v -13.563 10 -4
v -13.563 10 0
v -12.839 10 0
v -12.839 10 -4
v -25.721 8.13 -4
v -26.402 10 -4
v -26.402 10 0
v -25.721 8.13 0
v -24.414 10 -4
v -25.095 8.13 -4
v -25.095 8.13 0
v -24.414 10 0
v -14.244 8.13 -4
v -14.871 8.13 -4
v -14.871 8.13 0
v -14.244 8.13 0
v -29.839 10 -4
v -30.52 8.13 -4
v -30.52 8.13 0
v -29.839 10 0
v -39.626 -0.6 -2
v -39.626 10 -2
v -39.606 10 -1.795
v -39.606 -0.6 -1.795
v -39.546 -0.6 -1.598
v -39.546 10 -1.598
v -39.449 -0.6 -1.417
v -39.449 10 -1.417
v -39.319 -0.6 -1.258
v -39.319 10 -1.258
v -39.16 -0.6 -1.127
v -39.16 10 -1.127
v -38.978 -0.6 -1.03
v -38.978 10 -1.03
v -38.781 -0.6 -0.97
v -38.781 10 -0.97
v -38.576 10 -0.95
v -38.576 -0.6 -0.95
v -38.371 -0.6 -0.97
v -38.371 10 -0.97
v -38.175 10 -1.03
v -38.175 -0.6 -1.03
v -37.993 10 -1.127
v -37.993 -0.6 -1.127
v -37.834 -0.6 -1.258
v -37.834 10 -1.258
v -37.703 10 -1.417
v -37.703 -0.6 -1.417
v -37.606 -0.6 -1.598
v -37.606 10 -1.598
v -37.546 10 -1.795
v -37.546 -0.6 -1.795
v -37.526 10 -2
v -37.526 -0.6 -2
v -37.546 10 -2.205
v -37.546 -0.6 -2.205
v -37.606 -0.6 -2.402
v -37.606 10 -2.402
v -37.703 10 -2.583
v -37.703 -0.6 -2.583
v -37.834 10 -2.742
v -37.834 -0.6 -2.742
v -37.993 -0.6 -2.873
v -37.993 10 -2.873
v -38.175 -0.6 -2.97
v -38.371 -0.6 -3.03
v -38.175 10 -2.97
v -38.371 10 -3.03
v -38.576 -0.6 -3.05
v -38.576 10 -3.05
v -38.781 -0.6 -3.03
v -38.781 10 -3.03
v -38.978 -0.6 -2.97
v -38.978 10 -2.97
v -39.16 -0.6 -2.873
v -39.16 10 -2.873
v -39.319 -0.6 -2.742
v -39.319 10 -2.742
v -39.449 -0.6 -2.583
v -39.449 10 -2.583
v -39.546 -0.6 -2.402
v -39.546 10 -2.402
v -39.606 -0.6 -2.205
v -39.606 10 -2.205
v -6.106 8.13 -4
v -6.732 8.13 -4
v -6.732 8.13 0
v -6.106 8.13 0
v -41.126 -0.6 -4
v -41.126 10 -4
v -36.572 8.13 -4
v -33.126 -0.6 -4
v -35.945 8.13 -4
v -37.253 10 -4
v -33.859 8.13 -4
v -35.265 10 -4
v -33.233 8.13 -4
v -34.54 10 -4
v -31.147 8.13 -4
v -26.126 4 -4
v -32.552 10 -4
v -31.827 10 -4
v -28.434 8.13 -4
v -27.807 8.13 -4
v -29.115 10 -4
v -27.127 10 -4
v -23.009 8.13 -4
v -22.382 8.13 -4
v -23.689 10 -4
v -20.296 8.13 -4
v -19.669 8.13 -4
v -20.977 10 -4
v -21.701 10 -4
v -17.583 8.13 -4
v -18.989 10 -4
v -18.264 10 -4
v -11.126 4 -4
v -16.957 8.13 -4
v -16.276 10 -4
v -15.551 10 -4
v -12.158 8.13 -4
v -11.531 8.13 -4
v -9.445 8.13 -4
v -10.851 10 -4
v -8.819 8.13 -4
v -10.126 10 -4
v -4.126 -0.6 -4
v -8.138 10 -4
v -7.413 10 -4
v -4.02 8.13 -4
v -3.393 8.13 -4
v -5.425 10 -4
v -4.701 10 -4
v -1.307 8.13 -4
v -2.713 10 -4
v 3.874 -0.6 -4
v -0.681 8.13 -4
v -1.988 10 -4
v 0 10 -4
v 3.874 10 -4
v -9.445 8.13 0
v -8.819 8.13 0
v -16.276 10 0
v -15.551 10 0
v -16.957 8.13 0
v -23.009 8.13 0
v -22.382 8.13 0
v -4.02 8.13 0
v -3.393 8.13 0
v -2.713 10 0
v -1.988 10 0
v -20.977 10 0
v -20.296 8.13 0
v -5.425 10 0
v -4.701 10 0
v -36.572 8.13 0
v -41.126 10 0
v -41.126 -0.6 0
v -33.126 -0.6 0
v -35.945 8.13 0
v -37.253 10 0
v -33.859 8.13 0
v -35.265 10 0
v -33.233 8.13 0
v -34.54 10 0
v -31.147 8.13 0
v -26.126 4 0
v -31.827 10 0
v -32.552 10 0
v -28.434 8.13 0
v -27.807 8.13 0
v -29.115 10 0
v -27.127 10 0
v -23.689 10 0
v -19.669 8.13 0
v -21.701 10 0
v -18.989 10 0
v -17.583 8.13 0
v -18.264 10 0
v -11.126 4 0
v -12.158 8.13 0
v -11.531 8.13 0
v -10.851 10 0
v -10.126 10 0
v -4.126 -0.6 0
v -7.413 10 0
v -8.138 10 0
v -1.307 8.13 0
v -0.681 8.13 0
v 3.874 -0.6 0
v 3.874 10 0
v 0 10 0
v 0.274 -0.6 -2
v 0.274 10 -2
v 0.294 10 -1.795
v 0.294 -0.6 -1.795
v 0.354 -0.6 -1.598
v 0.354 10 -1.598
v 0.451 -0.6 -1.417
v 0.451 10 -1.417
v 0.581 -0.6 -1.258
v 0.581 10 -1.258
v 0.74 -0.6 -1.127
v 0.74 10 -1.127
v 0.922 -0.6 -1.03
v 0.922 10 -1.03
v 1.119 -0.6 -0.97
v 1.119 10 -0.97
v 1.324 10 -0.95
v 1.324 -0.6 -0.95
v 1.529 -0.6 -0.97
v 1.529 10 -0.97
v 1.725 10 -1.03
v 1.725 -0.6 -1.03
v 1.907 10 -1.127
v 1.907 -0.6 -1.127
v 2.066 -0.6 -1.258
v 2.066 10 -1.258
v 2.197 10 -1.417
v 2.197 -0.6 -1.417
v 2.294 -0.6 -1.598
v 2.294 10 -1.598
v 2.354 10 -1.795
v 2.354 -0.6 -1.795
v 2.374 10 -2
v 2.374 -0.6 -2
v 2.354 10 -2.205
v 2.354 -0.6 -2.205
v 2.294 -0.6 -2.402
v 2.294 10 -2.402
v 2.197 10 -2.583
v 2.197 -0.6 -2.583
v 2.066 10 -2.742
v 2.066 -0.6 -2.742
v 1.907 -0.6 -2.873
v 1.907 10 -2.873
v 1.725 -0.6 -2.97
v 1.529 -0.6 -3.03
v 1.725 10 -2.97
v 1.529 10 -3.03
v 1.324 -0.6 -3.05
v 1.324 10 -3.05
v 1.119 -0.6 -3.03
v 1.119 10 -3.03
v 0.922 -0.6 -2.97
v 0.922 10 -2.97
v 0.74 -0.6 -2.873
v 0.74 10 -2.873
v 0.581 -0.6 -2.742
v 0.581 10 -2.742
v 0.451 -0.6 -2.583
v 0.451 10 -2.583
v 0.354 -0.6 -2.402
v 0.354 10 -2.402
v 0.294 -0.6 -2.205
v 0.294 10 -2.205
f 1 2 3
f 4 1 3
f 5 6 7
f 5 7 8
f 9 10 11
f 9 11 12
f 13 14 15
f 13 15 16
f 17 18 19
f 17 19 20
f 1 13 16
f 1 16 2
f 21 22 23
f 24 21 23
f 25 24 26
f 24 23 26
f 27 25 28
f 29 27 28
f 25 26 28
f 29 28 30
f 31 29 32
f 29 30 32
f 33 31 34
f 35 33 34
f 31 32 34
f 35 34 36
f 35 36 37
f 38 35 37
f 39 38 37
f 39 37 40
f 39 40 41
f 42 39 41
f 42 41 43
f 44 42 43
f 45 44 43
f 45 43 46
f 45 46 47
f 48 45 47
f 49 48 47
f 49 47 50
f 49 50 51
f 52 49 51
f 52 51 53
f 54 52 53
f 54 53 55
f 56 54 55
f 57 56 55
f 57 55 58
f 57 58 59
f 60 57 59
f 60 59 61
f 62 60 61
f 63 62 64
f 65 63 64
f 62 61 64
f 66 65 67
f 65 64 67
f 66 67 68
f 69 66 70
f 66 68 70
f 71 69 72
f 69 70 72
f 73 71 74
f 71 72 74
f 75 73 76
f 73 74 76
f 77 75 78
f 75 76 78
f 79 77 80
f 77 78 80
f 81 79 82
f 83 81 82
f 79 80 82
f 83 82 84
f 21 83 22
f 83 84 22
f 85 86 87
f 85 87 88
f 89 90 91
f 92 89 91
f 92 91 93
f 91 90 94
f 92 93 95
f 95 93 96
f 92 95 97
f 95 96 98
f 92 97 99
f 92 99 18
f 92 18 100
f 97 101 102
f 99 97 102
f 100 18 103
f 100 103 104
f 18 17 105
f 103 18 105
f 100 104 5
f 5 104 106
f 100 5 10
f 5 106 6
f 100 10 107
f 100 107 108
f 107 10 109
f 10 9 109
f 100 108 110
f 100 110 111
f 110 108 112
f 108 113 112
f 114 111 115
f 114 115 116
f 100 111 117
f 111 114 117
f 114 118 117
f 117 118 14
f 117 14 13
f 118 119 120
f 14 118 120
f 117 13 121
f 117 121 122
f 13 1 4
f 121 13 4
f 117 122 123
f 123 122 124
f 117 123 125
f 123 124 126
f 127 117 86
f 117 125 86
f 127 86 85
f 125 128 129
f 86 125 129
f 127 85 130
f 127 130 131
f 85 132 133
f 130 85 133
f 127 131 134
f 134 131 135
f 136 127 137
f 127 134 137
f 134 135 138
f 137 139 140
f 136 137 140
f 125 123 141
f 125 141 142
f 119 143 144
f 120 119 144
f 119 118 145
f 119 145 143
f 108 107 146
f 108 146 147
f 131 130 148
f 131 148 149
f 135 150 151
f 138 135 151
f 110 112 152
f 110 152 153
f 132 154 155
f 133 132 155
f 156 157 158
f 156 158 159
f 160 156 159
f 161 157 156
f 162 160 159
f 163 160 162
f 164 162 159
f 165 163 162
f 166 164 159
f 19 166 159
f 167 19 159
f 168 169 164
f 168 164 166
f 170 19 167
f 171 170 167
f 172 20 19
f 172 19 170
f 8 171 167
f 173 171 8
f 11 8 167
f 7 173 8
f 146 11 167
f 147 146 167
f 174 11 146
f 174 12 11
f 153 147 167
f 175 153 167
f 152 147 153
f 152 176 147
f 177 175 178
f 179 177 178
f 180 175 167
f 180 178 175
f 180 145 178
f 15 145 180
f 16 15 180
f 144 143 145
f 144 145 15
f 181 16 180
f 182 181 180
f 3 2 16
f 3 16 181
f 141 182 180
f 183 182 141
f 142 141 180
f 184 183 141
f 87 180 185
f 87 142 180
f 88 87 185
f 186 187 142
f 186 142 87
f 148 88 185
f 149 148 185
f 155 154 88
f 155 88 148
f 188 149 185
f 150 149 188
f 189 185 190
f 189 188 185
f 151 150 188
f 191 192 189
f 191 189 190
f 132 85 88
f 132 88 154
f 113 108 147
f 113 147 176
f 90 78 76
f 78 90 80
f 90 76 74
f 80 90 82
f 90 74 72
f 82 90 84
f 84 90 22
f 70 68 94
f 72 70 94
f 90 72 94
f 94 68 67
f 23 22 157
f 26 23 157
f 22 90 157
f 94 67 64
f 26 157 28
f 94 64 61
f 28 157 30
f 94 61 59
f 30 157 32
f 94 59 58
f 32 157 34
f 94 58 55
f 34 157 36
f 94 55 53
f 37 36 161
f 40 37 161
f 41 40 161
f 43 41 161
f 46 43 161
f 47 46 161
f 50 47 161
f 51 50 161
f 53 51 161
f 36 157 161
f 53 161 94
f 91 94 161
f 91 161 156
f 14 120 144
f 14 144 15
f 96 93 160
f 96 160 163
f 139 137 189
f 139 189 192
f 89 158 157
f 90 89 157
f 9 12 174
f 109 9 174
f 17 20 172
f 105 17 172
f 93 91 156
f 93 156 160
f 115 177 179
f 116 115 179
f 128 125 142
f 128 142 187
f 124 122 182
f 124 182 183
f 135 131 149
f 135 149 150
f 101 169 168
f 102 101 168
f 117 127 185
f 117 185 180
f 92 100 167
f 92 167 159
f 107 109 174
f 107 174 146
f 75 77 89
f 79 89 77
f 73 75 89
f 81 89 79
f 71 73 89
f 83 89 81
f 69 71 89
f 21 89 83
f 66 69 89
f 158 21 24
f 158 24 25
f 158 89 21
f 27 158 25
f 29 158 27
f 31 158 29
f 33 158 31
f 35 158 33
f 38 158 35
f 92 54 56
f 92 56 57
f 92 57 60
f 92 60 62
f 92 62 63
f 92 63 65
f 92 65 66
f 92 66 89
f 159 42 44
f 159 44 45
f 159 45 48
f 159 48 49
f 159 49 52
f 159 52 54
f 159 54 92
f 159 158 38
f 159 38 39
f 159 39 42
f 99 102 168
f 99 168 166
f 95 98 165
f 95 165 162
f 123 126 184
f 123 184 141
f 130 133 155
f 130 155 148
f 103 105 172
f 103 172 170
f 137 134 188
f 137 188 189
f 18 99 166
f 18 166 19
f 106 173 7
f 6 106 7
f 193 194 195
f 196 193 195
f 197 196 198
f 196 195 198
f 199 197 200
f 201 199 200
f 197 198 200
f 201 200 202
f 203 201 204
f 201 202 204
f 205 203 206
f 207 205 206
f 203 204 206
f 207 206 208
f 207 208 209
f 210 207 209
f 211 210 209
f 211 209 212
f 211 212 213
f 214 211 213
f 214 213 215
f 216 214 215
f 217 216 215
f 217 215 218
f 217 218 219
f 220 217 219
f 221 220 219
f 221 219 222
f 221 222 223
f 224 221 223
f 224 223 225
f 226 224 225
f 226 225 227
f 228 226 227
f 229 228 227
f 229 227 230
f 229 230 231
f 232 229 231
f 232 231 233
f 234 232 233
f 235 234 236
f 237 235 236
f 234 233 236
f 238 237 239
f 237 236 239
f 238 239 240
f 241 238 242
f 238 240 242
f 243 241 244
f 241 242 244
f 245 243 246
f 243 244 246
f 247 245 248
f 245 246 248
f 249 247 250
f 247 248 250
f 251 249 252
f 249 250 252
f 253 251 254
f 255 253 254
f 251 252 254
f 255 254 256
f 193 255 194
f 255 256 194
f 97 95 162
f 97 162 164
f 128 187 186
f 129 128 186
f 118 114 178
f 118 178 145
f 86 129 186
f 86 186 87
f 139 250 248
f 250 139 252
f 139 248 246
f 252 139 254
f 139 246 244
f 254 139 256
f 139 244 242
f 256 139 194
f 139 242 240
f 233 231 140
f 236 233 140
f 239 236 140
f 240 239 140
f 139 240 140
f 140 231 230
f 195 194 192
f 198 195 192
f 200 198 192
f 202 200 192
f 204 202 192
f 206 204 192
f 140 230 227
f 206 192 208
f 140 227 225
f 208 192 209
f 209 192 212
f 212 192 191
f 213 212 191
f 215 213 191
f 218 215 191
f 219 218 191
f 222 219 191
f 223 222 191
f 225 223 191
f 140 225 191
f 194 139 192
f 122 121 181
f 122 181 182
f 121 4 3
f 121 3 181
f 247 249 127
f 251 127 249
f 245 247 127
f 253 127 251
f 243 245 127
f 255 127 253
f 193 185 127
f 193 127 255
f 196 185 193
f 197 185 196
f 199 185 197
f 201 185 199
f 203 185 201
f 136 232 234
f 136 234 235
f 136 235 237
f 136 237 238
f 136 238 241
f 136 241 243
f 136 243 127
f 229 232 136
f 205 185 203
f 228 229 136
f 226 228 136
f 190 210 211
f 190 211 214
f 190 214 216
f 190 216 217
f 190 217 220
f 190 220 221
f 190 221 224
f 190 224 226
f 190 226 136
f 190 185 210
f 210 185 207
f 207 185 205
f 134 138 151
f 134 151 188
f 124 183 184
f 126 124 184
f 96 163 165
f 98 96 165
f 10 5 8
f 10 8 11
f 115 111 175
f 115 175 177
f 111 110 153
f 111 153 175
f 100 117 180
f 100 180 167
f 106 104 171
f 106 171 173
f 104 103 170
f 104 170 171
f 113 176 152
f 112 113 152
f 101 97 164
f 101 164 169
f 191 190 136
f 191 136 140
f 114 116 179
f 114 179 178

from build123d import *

# Parameters (mm, degrees)
SKETCH3_W           = 45
SKETCH3_H           = 10.6
BOSS_EXTRUDE2_DEPTH = 4
CUT_EXTRUDE4_REACH  = 44.658
SKETCH4_R           = 1.05
CUT_EXTRUDE7_REACH  = 44.513
CUT_EXTRUDE8_START  = -4
CUT_EXTRUDE8_DEPTH  = 4


# Read off the part's stored shape, not the designer's step: Cut-Extrude8
with BuildPart() as part:
    # Sketch3 → Boss-Extrude2 (new body)
    with BuildSketch(Plane.XY):
        with Locations((-18.626321401, 4.7)):
            Rectangle(SKETCH3_W, SKETCH3_H)
    extrude(amount=-BOSS_EXTRUDE2_DEPTH)

    # Sketch4 → Cut-Extrude4 (cut, up to next)
    with BuildSketch(Plane(origin=(0, 10, 0), x_dir=(1, 0, 0), z_dir=(0, 1, 0)), mode=Mode.PRIVATE) as cut_extrude4_sk1:
        with Locations(Location((-38.576321401, 2, 0), (0, 0, 180))):
            Circle(SKETCH4_R)
    cut_extrude4_tool1 = extrude(cut_extrude4_sk1.sketch, amount=-CUT_EXTRUDE4_REACH, mode=Mode.PRIVATE) & part.part
    # Sketch4 → Cut-Extrude4 (cut, up to next)
    with BuildSketch(Plane(origin=(0, 10, 0), x_dir=(1, 0, 0), z_dir=(0, 1, 0)), mode=Mode.PRIVATE) as cut_extrude4_sk2:
        with Locations(Location((1.323678599, 2, 0), (0, 0, 180))):
            Circle(SKETCH4_R)
    cut_extrude4_tool2 = extrude(cut_extrude4_sk2.sketch, amount=-CUT_EXTRUDE4_REACH, mode=Mode.PRIVATE) & part.part
    add(cut_extrude4_tool1.solids().sort_by_distance((-38.576321, 10, -2))[0], mode=Mode.SUBTRACT)
    add(cut_extrude4_tool2.solids().sort_by_distance((1.323679, 10, -2))[0], mode=Mode.SUBTRACT)

    # Sketch6 → Cut-Extrude7 (cut, up to next)
    with BuildSketch(Plane(origin=(0, 0, -4), x_dir=(-1, 0, 0), z_dir=(0, 0, -1)), mode=Mode.PRIVATE) as cut_extrude7_sk1:
        Polygon((4.126321401, -0.6), (11.126321401, 4), (26.126321401, 4), (33.126321401, -0.6), align=None)
    cut_extrude7_tool1 = extrude(cut_extrude7_sk1.sketch, amount=-CUT_EXTRUDE7_REACH, mode=Mode.PRIVATE) & part.part
    add(cut_extrude7_tool1.solids().sort_by_distance((-18.626321, 1.456061, -4))[0], mode=Mode.SUBTRACT)

    # Cut-Extrude8 outline → Cut-Extrude8 (cut)
    with BuildSketch(Plane.XY.offset(CUT_EXTRUDE8_START)):
        Polygon((-35.264703894, 10), (-37.252642802, 10), (-36.571857508, 8.129557778), (-35.945489188, 8.129557778), align=None)
        Polygon((0, 10), (-1.987938907, 10), (-1.307153614, 8.129557778), (-0.680785294, 8.129557778), align=None)
        Polygon((-2.71266953, 10), (-4.700608438, 10), (-4.019823144, 8.129557778), (-3.393454824, 8.129557778), align=None)
        Polygon((-5.425339061, 10), (-7.413277968, 10), (-6.732492674, 8.129557778), (-6.106124354, 8.129557778), align=None)
        Polygon((-8.138008591, 10), (-10.125947498, 10), (-9.445162205, 8.129557778), (-8.818793885, 8.129557778), align=None)
        Polygon((-10.850678121, 10), (-12.838617029, 10), (-12.157831735, 8.129557778), (-11.531463415, 8.129557778), align=None)
        Polygon((-13.563347652, 10), (-15.551286559, 10), (-14.870501265, 8.129557778), (-14.244132945, 8.129557778), align=None)
        Polygon((-16.276017182, 10), (-18.263956089, 10), (-17.583170796, 8.129557778), (-16.956802476, 8.129557778), align=None)
        Polygon((-18.988686712, 10), (-20.97662562, 10), (-20.295840326, 8.129557778), (-19.669472006, 8.129557778), align=None)
        Polygon((-21.701356243, 10), (-23.68929515, 10), (-23.008509856, 8.129557778), (-22.382141536, 8.129557778), align=None)
        Polygon((-24.414025773, 10), (-26.40196468, 10), (-25.721179387, 8.129557778), (-25.094811067, 8.129557778), align=None)
        Polygon((-27.126695303, 10), (-29.114634211, 10), (-28.433848917, 8.129557778), (-27.807480597, 8.129557778), align=None)
        Polygon((-29.839364834, 10), (-31.827303741, 10), (-31.146518447, 8.129557778), (-30.520150127, 8.129557778), align=None)
        Polygon((-32.552034364, 10), (-34.539973271, 10), (-33.859187978, 8.129557778), (-33.232819658, 8.129557778), align=None)
    extrude(amount=CUT_EXTRUDE8_DEPTH, mode=Mode.SUBTRACT)


solid = part.part
